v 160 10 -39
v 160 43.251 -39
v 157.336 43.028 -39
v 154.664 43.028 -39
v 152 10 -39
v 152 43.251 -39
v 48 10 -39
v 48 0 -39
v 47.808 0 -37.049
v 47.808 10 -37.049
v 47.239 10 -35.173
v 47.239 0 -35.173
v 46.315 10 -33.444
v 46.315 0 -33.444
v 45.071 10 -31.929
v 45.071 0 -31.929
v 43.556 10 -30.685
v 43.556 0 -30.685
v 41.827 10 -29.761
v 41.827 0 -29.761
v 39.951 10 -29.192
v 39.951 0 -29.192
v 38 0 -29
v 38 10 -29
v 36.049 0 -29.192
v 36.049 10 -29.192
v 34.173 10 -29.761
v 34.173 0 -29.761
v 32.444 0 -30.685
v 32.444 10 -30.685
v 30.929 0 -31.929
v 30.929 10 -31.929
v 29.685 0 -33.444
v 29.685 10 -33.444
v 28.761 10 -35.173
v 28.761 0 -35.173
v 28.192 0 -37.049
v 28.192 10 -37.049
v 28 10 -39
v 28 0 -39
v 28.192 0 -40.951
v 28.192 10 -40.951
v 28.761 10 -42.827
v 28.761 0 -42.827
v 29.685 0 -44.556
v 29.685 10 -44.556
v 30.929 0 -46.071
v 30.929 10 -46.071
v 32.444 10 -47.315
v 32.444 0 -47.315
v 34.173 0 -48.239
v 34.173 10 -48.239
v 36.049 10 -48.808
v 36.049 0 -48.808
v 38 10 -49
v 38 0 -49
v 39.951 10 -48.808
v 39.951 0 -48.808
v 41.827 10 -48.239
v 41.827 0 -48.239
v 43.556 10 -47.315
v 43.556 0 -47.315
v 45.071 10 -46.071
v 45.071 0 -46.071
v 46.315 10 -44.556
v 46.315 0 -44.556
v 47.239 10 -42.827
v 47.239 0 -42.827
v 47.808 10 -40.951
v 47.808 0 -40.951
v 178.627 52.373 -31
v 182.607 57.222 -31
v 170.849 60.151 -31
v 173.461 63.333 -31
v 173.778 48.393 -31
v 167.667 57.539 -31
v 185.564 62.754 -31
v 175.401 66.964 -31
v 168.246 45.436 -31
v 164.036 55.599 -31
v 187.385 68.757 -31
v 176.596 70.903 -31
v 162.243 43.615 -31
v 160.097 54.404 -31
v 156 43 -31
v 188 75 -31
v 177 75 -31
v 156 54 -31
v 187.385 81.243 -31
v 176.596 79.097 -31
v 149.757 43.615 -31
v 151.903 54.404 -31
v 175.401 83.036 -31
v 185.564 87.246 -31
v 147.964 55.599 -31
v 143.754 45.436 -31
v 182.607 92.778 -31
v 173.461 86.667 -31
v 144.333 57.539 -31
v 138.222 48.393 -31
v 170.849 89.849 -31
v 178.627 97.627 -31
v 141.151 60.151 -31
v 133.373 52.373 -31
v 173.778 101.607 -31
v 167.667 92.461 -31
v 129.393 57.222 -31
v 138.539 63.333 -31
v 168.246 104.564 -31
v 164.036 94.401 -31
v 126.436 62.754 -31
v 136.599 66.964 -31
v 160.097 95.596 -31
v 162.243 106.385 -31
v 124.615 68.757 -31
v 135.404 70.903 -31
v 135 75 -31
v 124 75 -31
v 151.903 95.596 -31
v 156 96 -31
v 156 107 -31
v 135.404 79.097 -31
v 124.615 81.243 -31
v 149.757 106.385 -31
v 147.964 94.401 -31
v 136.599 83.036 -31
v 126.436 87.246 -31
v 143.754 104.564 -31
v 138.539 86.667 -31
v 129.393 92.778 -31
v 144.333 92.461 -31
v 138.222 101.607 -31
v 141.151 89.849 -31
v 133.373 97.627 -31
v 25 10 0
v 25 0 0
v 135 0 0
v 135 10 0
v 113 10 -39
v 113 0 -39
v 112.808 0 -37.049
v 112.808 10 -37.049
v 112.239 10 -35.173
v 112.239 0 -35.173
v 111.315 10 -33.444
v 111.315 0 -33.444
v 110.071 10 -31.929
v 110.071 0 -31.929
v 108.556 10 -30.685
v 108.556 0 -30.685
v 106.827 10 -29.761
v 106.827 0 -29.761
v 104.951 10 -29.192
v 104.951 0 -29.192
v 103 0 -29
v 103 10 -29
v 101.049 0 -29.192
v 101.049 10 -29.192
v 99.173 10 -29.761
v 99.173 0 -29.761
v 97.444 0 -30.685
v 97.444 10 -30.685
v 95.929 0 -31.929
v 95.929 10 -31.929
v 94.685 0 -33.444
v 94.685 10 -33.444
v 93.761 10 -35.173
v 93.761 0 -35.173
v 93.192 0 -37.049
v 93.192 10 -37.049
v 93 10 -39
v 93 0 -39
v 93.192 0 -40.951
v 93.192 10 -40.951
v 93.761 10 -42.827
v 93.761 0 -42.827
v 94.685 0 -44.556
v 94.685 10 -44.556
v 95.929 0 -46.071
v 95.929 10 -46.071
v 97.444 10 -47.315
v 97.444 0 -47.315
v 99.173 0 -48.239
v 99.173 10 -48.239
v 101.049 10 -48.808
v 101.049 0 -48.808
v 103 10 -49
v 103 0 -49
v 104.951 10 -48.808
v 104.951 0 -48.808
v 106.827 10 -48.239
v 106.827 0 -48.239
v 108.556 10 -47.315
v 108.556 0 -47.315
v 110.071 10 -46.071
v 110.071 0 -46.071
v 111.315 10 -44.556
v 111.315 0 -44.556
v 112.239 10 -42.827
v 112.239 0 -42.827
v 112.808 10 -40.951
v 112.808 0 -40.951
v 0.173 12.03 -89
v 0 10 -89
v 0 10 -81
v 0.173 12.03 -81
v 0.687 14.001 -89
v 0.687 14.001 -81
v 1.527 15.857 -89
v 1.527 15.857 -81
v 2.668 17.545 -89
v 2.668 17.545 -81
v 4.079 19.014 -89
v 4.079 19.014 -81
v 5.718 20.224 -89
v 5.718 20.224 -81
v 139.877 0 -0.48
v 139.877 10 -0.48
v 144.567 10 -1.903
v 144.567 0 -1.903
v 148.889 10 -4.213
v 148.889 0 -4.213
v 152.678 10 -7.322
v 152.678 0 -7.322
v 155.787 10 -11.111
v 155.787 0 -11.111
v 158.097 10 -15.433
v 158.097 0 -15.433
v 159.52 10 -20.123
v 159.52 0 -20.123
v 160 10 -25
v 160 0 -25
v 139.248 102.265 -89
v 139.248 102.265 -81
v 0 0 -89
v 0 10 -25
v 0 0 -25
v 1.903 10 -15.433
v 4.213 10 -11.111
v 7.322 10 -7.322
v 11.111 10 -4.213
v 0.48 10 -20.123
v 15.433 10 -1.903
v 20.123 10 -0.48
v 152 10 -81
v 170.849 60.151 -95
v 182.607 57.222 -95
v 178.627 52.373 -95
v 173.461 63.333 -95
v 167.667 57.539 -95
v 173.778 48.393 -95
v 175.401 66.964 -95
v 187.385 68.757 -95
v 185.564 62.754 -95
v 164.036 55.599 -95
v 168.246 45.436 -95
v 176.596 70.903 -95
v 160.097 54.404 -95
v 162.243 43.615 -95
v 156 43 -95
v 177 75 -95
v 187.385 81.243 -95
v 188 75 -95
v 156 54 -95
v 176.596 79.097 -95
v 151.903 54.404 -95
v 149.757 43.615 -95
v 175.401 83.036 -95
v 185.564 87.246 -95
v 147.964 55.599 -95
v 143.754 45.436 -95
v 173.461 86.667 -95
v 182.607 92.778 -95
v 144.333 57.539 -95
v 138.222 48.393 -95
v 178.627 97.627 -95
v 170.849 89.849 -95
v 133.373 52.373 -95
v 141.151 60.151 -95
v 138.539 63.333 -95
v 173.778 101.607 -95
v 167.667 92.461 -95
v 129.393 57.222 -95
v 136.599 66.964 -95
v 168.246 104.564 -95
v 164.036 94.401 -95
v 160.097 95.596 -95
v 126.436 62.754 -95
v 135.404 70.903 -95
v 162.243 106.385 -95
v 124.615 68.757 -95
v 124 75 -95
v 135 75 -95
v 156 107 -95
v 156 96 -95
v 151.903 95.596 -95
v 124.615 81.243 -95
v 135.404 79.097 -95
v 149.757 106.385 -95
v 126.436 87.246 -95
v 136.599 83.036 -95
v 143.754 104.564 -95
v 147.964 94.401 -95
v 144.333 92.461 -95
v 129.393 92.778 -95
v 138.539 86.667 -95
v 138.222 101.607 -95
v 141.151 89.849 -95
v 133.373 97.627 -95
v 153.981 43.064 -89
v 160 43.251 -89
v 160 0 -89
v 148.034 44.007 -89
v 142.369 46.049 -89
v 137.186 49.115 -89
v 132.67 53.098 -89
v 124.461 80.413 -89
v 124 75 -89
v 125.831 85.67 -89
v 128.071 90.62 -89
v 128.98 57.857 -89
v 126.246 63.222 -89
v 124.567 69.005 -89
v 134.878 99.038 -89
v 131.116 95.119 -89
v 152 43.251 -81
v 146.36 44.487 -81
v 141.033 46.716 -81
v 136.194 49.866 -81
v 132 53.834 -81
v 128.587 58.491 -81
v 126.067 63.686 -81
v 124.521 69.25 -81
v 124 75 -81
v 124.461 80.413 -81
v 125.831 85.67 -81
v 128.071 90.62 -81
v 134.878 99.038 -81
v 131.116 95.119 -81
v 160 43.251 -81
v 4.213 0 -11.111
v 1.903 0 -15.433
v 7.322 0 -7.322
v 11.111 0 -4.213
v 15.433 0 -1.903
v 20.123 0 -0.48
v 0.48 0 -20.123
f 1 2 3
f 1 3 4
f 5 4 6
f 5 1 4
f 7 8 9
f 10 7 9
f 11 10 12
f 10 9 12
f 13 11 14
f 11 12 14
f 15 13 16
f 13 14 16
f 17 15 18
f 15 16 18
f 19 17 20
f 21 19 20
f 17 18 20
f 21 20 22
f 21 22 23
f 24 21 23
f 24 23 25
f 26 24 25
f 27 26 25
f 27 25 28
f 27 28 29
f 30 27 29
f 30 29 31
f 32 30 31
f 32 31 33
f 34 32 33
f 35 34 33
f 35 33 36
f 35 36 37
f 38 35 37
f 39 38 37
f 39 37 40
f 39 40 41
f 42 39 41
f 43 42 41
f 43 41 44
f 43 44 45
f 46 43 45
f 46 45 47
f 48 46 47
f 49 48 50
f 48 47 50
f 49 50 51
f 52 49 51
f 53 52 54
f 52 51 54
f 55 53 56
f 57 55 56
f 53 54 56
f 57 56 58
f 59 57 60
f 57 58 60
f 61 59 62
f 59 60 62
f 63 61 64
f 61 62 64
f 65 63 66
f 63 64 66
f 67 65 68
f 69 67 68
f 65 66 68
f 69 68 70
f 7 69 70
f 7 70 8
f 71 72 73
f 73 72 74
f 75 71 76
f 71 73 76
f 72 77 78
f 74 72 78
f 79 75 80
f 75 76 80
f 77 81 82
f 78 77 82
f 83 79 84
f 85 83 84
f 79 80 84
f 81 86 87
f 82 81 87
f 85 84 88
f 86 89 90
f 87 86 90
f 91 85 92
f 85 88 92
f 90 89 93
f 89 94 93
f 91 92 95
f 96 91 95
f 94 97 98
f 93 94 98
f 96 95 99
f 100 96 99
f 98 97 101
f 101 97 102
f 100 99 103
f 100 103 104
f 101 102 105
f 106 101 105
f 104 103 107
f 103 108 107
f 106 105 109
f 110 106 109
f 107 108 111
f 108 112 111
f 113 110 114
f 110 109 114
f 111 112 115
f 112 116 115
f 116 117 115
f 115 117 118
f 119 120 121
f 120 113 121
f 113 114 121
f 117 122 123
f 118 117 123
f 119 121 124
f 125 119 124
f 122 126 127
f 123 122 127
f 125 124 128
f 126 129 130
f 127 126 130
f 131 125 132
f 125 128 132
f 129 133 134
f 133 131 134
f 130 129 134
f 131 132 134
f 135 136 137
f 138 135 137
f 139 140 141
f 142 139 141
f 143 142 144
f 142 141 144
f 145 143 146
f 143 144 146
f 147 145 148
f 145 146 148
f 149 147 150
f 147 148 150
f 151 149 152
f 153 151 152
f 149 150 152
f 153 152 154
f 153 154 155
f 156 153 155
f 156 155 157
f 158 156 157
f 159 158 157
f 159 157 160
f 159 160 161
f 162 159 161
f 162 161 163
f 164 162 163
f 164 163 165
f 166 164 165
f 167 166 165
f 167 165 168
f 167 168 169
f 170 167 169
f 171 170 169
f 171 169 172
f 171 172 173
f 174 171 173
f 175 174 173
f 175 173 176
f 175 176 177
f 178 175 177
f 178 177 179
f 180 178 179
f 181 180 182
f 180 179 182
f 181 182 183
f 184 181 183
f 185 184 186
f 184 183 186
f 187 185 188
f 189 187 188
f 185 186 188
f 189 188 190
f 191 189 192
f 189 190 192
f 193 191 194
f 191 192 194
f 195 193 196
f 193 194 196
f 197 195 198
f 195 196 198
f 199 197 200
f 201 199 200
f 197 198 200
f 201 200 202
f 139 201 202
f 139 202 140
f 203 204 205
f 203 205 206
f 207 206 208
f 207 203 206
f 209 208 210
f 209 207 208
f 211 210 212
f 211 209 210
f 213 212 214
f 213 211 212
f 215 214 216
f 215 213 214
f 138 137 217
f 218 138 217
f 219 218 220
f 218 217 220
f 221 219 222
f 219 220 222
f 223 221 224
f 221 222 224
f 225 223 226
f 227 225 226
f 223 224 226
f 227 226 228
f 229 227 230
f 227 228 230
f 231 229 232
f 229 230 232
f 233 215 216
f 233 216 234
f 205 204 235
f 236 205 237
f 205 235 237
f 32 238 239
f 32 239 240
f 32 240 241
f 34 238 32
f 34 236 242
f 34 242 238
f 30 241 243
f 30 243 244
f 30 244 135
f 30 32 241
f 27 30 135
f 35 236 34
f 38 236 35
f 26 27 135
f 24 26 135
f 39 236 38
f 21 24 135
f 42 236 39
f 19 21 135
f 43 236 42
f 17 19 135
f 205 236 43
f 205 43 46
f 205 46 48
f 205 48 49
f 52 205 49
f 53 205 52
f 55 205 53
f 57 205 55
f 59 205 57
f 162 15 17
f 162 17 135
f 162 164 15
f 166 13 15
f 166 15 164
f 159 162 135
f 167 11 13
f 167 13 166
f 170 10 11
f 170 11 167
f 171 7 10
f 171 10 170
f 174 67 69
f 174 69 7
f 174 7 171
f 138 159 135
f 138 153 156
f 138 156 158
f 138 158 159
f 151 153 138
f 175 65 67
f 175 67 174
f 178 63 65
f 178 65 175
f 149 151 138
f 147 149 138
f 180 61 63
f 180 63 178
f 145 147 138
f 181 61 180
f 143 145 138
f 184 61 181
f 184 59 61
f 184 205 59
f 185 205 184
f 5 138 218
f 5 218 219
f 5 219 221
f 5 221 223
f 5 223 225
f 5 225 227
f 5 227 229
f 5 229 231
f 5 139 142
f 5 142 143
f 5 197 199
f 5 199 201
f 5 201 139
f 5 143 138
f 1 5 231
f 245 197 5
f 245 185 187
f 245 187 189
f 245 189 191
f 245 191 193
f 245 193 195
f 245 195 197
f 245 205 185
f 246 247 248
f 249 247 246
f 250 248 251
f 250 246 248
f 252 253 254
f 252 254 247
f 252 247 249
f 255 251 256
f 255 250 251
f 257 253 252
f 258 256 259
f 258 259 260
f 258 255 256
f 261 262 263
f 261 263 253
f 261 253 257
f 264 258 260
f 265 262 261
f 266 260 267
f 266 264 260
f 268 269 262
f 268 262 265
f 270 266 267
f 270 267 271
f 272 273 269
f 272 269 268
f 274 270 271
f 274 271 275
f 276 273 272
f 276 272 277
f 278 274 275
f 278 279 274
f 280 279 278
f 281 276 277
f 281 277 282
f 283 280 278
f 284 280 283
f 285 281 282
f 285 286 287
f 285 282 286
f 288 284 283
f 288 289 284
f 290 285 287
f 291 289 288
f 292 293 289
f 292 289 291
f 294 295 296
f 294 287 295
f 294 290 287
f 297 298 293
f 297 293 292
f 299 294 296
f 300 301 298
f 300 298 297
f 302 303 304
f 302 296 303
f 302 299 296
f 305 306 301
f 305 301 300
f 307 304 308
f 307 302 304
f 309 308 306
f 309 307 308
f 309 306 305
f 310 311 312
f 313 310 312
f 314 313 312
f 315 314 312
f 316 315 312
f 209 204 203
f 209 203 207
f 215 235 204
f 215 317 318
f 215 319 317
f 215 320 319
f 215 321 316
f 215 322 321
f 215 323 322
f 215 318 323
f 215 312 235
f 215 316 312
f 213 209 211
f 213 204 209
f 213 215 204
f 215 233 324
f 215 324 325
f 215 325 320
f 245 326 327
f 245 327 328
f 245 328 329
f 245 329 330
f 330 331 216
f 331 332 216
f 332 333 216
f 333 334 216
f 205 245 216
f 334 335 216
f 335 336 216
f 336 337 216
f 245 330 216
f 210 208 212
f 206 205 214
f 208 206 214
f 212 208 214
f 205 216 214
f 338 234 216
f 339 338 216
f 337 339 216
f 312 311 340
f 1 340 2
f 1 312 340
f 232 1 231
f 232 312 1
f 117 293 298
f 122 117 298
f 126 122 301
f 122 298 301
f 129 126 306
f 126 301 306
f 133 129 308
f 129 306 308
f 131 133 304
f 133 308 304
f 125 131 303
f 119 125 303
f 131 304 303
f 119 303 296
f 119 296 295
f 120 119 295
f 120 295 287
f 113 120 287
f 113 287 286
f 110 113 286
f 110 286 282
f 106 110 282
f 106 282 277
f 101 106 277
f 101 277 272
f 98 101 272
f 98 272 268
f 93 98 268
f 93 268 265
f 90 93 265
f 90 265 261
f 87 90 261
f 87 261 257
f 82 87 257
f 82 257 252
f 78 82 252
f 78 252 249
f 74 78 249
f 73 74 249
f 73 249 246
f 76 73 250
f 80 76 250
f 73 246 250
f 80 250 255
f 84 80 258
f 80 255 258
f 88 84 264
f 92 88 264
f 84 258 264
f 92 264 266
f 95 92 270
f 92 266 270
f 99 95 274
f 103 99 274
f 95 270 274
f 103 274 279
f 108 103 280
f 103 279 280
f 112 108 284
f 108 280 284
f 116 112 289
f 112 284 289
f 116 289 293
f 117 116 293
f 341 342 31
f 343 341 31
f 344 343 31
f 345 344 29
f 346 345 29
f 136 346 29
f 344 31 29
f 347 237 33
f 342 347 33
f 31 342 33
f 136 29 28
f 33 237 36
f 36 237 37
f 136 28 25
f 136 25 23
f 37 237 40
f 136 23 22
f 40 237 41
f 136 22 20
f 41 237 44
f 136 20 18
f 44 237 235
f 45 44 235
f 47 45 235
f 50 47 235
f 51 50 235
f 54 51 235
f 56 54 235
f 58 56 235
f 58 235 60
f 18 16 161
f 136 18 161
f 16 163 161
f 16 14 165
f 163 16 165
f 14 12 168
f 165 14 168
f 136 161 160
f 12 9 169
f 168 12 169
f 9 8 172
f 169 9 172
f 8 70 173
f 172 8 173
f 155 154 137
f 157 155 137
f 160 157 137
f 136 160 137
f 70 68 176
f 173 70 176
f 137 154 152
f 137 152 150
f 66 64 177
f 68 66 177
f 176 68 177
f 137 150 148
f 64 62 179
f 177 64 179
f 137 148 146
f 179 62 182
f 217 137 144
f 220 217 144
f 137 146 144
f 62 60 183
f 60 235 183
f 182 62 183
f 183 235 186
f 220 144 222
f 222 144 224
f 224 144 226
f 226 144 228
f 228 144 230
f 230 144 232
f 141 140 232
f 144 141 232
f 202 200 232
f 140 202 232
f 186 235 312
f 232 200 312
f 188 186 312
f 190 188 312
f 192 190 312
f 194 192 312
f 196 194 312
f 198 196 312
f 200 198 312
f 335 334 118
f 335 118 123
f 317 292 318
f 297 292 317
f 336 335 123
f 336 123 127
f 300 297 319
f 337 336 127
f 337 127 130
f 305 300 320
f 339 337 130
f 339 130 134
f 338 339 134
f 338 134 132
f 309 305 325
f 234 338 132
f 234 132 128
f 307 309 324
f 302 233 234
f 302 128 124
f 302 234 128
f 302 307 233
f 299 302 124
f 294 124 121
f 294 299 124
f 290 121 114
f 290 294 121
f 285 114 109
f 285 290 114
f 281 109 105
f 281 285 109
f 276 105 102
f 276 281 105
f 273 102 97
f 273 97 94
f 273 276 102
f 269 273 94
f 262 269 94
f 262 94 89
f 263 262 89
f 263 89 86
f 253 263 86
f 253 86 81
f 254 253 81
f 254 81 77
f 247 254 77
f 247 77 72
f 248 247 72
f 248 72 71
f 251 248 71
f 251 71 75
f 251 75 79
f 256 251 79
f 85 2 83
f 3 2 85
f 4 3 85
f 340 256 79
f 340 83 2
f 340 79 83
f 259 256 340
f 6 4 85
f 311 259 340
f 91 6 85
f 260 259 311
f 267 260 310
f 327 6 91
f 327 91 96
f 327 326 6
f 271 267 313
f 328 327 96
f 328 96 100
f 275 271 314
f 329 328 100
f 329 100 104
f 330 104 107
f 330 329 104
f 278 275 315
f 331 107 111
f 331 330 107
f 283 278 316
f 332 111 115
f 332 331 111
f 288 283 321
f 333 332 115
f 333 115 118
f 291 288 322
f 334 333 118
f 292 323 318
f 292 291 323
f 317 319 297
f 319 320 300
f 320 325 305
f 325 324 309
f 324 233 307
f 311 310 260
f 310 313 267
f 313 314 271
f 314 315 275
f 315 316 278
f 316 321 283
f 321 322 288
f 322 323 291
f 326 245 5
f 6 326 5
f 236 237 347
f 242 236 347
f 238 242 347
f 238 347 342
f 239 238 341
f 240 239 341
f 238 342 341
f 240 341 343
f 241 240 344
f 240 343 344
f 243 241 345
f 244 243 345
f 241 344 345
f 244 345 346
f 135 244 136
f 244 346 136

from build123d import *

# Parameters (mm, degrees)
BASE_EXTRUDE_DEPTH       = 10
BOSS_EXTRUDE1_DEPTH      = 8
SKETCH3_R                = 32
BOSS_EXTRUDE2_DEPTH      = 64
SKETCH7_R                = 21
CUT_EXTRUDE1_DEPTH       = 237.258333186
BOSS_EXTRUDE3_REACH      = 233.901
BOSS_EXTRUDE3_END_RADIUS = 32
SKETCH4_W                = 8
SKETCH4_H                = 42
HOLE1_D                  = 20
LPATTERN1_COUNT          = 2
LPATTERN1_PITCH          = 65


with BuildPart() as part:
    # Sketch1 → Base-Extrude (new body)
    with BuildSketch(Plane(origin=(0, 0, 0), x_dir=(1, 0, 0), z_dir=(0, 1, 0))):
        with BuildLine():
            Line((25, 0), (135, 0))
            ThreePointArc((135, 0), (152.67766953, 7.32233047), (160, 25))
            Line((160, 25), (160, 89))
            Line((160, 89), (0, 89))
            Line((0, 89), (0, 25))
            ThreePointArc((0, 25), (7.32233047, 7.32233047), (25, 0))
        make_face()
    extrude(amount=BASE_EXTRUDE_DEPTH)

    # Sketch2 → Boss-Extrude1 (add)
    with BuildSketch(Plane(origin=(0, 0, -89), x_dir=(-1, 0, 0), z_dir=(0, 0, -1))):
        with BuildLine():
            Line((-160, 10), (0, 10))
            ThreePointArc((0, 10), (-1.526648698, 15.857381028), (-5.718152085, 20.224401536))
            Line((-5.718152085, 20.224401536), (-139.248405559, 102.265070762))
            ThreePointArc((-139.248405559, 102.265070762), (-186.188017348, 85.615253581), (-160, 43.250984267))
            Line((-160, 43.250984267), (-160, 10))
        make_face()
    extrude(amount=-BOSS_EXTRUDE1_DEPTH)

    # Sketch3 → Boss-Extrude2 (add)
    with BuildSketch(Plane(origin=(0, 0, -95), x_dir=(-1, 0, 0), z_dir=(0, 0, -1))):
        with Locations((-156, 75)):
            Circle(SKETCH3_R)
    extrude(amount=-BOSS_EXTRUDE2_DEPTH)

    # Sketch7 → Cut-Extrude1 (cut, through all)
    with BuildSketch(Plane(origin=(0, 0, -95), x_dir=(-1, 0, 0), z_dir=(0, 0, -1))):
        with Locations((-156, 75)):
            Circle(SKETCH7_R)
    extrude(amount=-CUT_EXTRUDE1_DEPTH, mode=Mode.SUBTRACT)

    # Boss-Extrude3: up to this cylinder (the profile starts outside it)
    boss_extrude3_end = Plane(origin=(156, 75, -60), z_dir=(0, 0, -1)) * Cylinder(BOSS_EXTRUDE3_END_RADIUS, 532.802, mode=Mode.PRIVATE)
    # Sketch4 → Boss-Extrude3 (add, up to the surface)
    with BuildSketch(Plane(origin=(0, 10, 0), x_dir=(-1, 0, 0), z_dir=(0, 1, 0)), mode=Mode.PRIVATE) as boss_extrude3_sk1:
        with Locations((-156, -60)):
            Rectangle(SKETCH4_W, SKETCH4_H)
    boss_extrude3_tool1 = extrude(boss_extrude3_sk1.sketch, amount=BOSS_EXTRUDE3_REACH, mode=Mode.PRIVATE) - boss_extrude3_end
    add(boss_extrude3_tool1.solids().sort_by_distance((156, 10, -60))[0])

    # Hole1 (through all)
    with Locations(Plane(origin=(0, 10, 0), x_dir=(-1, 0, 0), z_dir=(0, 1, 0))):
        with Locations((-38, -39)):
            hole1 = Hole(HOLE1_D / 2)

    # LPattern1: Hole1 ×2
    with Locations(*[(i * LPATTERN1_PITCH, 0, 0) for i in range(1, LPATTERN1_COUNT)]):
        add(hole1, mode=Mode.SUBTRACT)


solid = part.part
